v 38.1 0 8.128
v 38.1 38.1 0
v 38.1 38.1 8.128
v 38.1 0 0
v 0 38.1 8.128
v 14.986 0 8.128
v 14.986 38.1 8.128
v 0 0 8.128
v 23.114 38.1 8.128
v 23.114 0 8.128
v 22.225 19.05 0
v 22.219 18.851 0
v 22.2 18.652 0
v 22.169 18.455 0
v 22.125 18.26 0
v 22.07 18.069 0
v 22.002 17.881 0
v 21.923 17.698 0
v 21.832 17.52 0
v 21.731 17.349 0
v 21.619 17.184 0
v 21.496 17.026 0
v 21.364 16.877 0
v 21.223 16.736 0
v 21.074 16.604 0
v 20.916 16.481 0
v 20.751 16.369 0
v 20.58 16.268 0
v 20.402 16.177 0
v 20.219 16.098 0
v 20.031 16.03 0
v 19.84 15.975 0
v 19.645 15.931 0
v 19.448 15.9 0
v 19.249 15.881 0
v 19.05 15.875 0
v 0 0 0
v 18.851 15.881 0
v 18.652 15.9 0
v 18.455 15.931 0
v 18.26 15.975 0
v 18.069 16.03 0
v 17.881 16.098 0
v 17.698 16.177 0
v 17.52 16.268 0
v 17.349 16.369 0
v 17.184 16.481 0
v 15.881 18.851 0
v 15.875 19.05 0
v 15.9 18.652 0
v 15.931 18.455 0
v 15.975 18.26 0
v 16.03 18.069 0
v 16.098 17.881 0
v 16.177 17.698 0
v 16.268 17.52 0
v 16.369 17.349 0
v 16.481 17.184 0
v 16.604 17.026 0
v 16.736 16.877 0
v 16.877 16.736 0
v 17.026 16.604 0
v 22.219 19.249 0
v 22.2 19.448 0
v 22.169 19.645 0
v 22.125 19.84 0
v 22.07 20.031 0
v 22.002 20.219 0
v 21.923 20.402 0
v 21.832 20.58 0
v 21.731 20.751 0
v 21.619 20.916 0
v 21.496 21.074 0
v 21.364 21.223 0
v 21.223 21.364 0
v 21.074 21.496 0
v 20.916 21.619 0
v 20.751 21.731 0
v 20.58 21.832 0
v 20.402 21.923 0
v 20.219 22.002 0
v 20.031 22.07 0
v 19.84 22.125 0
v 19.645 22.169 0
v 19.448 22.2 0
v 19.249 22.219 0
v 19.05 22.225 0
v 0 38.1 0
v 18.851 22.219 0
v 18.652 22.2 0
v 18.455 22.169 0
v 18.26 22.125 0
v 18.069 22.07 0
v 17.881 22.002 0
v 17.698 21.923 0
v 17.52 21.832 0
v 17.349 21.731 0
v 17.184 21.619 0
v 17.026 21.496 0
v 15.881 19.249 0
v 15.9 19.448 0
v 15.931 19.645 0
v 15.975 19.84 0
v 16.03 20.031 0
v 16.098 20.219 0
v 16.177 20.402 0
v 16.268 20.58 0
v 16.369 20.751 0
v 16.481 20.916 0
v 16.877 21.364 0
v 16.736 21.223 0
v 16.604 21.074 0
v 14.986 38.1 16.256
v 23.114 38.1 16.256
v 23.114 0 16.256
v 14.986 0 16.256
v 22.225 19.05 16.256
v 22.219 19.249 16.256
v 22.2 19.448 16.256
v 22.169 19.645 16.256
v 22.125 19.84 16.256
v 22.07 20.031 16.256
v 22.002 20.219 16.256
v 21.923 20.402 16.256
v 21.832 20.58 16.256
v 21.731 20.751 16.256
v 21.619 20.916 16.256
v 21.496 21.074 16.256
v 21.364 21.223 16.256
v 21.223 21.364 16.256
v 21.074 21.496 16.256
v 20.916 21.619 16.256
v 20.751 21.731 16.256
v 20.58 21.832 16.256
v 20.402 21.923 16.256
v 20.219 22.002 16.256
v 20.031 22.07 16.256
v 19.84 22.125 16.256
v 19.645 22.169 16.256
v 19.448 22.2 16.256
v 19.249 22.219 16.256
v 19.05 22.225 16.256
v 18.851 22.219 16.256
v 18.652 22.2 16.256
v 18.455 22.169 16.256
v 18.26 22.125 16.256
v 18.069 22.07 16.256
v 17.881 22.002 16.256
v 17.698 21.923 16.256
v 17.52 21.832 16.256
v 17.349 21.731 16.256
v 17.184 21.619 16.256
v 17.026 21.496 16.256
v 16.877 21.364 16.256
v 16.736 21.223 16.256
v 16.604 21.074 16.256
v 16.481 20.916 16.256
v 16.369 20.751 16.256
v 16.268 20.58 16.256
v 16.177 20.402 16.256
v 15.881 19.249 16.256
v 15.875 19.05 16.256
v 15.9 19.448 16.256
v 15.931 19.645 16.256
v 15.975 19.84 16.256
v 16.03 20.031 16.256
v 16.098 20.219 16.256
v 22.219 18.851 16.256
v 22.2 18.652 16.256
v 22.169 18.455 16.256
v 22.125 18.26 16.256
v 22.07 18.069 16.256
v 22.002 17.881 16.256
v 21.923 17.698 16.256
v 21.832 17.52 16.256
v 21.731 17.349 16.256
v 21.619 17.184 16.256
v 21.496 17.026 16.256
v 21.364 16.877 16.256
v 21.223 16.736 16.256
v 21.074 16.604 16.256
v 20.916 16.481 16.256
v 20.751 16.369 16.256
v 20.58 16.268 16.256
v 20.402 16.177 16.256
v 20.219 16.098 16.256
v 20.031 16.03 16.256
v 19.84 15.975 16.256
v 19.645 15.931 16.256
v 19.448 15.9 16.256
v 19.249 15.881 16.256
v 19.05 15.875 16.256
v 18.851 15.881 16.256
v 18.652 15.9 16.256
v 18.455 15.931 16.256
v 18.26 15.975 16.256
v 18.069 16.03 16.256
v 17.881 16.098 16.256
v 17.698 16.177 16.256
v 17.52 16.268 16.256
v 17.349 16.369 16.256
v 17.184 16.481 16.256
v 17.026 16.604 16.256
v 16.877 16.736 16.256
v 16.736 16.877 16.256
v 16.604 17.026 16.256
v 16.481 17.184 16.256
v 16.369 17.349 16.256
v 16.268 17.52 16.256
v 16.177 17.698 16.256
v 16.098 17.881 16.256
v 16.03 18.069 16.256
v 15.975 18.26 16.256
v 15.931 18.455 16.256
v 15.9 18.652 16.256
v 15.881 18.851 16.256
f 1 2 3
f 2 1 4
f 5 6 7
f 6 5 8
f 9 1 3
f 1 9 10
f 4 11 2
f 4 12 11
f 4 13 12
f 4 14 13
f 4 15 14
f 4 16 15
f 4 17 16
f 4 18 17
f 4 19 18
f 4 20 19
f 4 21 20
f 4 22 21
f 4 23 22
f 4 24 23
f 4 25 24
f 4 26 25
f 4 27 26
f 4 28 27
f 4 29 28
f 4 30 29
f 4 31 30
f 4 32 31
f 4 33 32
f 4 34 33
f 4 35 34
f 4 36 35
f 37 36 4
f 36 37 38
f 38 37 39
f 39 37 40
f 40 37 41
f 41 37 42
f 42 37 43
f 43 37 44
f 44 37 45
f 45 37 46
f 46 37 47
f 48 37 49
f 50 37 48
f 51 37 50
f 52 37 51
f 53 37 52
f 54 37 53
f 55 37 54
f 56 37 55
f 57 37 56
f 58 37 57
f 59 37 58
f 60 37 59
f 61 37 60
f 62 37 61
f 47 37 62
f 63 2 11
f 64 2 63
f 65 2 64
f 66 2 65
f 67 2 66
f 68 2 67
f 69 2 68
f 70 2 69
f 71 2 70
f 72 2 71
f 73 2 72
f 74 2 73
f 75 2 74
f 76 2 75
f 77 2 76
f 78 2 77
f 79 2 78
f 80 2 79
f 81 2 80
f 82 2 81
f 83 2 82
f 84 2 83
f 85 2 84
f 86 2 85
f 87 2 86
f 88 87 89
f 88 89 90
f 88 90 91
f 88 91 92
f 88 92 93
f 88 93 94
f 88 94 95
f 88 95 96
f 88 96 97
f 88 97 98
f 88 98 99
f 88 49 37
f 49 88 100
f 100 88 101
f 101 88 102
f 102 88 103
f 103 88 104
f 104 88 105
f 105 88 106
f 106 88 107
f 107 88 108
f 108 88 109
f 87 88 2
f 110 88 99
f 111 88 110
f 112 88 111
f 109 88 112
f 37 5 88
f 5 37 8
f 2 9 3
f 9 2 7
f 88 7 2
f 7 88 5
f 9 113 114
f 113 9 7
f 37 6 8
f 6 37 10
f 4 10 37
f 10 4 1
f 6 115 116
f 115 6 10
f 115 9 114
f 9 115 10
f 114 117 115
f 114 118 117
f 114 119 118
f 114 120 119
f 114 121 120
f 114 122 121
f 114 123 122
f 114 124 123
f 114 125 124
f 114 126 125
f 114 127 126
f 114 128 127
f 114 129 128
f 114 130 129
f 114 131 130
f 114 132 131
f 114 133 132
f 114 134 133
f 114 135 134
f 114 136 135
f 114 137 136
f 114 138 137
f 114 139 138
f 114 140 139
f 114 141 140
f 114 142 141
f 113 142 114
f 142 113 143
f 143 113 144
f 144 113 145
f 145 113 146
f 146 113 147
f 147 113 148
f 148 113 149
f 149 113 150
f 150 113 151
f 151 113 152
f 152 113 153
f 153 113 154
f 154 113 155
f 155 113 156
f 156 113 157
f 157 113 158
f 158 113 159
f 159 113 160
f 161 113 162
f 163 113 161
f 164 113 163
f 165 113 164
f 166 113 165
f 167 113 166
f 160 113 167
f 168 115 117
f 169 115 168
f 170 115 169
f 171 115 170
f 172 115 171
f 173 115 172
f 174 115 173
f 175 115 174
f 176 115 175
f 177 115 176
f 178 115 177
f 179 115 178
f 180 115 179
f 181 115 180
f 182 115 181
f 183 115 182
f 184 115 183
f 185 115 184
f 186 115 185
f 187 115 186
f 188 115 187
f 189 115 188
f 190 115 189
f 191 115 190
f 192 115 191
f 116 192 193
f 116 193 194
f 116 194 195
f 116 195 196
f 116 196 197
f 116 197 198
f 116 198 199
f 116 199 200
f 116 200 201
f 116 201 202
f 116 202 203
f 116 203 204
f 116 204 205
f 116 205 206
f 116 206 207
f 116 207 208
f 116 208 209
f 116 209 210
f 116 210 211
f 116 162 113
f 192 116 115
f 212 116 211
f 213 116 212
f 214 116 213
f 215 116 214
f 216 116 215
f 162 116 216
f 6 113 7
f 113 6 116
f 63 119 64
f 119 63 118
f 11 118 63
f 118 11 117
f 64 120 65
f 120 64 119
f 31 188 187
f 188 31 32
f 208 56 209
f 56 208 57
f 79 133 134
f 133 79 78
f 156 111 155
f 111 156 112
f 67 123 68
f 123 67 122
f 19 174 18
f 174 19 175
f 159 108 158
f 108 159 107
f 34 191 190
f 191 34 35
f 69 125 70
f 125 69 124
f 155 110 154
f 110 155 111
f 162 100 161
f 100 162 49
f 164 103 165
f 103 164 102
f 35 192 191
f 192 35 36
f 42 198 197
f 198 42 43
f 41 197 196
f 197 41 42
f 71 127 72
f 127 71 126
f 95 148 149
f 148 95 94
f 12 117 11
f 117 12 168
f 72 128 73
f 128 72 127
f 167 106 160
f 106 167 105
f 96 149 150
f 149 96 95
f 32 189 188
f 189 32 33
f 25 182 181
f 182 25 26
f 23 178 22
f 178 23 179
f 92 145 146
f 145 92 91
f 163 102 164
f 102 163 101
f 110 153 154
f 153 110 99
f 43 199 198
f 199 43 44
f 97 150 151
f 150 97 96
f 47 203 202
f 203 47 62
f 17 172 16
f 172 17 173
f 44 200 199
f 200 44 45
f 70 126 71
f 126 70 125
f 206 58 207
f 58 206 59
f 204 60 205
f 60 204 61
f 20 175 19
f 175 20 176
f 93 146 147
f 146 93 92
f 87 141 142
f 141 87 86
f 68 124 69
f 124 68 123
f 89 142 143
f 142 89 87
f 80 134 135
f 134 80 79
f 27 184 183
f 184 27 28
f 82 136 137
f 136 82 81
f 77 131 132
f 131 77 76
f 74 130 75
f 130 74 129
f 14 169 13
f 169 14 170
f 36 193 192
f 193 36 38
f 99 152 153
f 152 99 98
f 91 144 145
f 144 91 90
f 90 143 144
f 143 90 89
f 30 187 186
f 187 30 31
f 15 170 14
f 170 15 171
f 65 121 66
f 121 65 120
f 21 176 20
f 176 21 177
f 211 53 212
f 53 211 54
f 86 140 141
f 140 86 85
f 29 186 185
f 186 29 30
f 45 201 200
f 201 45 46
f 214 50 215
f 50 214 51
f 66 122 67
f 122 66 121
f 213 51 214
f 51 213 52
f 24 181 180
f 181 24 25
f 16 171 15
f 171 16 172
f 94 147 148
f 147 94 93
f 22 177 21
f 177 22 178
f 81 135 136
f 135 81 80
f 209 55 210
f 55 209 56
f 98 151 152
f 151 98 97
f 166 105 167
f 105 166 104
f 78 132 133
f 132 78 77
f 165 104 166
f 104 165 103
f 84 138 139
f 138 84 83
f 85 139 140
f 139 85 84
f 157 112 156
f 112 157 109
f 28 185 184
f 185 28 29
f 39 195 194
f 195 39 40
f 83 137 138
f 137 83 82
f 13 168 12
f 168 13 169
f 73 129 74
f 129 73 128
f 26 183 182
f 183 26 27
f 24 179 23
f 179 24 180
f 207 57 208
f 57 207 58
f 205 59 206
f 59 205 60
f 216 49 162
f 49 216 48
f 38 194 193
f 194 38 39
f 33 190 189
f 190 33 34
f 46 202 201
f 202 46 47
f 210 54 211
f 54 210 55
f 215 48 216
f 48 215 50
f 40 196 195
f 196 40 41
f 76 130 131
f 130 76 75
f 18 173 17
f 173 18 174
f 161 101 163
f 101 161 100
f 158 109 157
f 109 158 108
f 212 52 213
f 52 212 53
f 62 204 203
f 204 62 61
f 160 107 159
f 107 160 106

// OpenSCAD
$fn=100;
xy = 38.1;
channel_xz = 8.128;

drill_dia = 6.35;

difference() {
  union() {
    cube([xy, xy, channel_xz]);
    translate([(xy-channel_xz)/2, 0, channel_xz]) {
      cube([channel_xz, xy, channel_xz]);
    }
  }
  translate([xy/2, xy/2, -1]) {
    cylinder(d=drill_dia, h = 2*channel_xz+2);
  }
}
